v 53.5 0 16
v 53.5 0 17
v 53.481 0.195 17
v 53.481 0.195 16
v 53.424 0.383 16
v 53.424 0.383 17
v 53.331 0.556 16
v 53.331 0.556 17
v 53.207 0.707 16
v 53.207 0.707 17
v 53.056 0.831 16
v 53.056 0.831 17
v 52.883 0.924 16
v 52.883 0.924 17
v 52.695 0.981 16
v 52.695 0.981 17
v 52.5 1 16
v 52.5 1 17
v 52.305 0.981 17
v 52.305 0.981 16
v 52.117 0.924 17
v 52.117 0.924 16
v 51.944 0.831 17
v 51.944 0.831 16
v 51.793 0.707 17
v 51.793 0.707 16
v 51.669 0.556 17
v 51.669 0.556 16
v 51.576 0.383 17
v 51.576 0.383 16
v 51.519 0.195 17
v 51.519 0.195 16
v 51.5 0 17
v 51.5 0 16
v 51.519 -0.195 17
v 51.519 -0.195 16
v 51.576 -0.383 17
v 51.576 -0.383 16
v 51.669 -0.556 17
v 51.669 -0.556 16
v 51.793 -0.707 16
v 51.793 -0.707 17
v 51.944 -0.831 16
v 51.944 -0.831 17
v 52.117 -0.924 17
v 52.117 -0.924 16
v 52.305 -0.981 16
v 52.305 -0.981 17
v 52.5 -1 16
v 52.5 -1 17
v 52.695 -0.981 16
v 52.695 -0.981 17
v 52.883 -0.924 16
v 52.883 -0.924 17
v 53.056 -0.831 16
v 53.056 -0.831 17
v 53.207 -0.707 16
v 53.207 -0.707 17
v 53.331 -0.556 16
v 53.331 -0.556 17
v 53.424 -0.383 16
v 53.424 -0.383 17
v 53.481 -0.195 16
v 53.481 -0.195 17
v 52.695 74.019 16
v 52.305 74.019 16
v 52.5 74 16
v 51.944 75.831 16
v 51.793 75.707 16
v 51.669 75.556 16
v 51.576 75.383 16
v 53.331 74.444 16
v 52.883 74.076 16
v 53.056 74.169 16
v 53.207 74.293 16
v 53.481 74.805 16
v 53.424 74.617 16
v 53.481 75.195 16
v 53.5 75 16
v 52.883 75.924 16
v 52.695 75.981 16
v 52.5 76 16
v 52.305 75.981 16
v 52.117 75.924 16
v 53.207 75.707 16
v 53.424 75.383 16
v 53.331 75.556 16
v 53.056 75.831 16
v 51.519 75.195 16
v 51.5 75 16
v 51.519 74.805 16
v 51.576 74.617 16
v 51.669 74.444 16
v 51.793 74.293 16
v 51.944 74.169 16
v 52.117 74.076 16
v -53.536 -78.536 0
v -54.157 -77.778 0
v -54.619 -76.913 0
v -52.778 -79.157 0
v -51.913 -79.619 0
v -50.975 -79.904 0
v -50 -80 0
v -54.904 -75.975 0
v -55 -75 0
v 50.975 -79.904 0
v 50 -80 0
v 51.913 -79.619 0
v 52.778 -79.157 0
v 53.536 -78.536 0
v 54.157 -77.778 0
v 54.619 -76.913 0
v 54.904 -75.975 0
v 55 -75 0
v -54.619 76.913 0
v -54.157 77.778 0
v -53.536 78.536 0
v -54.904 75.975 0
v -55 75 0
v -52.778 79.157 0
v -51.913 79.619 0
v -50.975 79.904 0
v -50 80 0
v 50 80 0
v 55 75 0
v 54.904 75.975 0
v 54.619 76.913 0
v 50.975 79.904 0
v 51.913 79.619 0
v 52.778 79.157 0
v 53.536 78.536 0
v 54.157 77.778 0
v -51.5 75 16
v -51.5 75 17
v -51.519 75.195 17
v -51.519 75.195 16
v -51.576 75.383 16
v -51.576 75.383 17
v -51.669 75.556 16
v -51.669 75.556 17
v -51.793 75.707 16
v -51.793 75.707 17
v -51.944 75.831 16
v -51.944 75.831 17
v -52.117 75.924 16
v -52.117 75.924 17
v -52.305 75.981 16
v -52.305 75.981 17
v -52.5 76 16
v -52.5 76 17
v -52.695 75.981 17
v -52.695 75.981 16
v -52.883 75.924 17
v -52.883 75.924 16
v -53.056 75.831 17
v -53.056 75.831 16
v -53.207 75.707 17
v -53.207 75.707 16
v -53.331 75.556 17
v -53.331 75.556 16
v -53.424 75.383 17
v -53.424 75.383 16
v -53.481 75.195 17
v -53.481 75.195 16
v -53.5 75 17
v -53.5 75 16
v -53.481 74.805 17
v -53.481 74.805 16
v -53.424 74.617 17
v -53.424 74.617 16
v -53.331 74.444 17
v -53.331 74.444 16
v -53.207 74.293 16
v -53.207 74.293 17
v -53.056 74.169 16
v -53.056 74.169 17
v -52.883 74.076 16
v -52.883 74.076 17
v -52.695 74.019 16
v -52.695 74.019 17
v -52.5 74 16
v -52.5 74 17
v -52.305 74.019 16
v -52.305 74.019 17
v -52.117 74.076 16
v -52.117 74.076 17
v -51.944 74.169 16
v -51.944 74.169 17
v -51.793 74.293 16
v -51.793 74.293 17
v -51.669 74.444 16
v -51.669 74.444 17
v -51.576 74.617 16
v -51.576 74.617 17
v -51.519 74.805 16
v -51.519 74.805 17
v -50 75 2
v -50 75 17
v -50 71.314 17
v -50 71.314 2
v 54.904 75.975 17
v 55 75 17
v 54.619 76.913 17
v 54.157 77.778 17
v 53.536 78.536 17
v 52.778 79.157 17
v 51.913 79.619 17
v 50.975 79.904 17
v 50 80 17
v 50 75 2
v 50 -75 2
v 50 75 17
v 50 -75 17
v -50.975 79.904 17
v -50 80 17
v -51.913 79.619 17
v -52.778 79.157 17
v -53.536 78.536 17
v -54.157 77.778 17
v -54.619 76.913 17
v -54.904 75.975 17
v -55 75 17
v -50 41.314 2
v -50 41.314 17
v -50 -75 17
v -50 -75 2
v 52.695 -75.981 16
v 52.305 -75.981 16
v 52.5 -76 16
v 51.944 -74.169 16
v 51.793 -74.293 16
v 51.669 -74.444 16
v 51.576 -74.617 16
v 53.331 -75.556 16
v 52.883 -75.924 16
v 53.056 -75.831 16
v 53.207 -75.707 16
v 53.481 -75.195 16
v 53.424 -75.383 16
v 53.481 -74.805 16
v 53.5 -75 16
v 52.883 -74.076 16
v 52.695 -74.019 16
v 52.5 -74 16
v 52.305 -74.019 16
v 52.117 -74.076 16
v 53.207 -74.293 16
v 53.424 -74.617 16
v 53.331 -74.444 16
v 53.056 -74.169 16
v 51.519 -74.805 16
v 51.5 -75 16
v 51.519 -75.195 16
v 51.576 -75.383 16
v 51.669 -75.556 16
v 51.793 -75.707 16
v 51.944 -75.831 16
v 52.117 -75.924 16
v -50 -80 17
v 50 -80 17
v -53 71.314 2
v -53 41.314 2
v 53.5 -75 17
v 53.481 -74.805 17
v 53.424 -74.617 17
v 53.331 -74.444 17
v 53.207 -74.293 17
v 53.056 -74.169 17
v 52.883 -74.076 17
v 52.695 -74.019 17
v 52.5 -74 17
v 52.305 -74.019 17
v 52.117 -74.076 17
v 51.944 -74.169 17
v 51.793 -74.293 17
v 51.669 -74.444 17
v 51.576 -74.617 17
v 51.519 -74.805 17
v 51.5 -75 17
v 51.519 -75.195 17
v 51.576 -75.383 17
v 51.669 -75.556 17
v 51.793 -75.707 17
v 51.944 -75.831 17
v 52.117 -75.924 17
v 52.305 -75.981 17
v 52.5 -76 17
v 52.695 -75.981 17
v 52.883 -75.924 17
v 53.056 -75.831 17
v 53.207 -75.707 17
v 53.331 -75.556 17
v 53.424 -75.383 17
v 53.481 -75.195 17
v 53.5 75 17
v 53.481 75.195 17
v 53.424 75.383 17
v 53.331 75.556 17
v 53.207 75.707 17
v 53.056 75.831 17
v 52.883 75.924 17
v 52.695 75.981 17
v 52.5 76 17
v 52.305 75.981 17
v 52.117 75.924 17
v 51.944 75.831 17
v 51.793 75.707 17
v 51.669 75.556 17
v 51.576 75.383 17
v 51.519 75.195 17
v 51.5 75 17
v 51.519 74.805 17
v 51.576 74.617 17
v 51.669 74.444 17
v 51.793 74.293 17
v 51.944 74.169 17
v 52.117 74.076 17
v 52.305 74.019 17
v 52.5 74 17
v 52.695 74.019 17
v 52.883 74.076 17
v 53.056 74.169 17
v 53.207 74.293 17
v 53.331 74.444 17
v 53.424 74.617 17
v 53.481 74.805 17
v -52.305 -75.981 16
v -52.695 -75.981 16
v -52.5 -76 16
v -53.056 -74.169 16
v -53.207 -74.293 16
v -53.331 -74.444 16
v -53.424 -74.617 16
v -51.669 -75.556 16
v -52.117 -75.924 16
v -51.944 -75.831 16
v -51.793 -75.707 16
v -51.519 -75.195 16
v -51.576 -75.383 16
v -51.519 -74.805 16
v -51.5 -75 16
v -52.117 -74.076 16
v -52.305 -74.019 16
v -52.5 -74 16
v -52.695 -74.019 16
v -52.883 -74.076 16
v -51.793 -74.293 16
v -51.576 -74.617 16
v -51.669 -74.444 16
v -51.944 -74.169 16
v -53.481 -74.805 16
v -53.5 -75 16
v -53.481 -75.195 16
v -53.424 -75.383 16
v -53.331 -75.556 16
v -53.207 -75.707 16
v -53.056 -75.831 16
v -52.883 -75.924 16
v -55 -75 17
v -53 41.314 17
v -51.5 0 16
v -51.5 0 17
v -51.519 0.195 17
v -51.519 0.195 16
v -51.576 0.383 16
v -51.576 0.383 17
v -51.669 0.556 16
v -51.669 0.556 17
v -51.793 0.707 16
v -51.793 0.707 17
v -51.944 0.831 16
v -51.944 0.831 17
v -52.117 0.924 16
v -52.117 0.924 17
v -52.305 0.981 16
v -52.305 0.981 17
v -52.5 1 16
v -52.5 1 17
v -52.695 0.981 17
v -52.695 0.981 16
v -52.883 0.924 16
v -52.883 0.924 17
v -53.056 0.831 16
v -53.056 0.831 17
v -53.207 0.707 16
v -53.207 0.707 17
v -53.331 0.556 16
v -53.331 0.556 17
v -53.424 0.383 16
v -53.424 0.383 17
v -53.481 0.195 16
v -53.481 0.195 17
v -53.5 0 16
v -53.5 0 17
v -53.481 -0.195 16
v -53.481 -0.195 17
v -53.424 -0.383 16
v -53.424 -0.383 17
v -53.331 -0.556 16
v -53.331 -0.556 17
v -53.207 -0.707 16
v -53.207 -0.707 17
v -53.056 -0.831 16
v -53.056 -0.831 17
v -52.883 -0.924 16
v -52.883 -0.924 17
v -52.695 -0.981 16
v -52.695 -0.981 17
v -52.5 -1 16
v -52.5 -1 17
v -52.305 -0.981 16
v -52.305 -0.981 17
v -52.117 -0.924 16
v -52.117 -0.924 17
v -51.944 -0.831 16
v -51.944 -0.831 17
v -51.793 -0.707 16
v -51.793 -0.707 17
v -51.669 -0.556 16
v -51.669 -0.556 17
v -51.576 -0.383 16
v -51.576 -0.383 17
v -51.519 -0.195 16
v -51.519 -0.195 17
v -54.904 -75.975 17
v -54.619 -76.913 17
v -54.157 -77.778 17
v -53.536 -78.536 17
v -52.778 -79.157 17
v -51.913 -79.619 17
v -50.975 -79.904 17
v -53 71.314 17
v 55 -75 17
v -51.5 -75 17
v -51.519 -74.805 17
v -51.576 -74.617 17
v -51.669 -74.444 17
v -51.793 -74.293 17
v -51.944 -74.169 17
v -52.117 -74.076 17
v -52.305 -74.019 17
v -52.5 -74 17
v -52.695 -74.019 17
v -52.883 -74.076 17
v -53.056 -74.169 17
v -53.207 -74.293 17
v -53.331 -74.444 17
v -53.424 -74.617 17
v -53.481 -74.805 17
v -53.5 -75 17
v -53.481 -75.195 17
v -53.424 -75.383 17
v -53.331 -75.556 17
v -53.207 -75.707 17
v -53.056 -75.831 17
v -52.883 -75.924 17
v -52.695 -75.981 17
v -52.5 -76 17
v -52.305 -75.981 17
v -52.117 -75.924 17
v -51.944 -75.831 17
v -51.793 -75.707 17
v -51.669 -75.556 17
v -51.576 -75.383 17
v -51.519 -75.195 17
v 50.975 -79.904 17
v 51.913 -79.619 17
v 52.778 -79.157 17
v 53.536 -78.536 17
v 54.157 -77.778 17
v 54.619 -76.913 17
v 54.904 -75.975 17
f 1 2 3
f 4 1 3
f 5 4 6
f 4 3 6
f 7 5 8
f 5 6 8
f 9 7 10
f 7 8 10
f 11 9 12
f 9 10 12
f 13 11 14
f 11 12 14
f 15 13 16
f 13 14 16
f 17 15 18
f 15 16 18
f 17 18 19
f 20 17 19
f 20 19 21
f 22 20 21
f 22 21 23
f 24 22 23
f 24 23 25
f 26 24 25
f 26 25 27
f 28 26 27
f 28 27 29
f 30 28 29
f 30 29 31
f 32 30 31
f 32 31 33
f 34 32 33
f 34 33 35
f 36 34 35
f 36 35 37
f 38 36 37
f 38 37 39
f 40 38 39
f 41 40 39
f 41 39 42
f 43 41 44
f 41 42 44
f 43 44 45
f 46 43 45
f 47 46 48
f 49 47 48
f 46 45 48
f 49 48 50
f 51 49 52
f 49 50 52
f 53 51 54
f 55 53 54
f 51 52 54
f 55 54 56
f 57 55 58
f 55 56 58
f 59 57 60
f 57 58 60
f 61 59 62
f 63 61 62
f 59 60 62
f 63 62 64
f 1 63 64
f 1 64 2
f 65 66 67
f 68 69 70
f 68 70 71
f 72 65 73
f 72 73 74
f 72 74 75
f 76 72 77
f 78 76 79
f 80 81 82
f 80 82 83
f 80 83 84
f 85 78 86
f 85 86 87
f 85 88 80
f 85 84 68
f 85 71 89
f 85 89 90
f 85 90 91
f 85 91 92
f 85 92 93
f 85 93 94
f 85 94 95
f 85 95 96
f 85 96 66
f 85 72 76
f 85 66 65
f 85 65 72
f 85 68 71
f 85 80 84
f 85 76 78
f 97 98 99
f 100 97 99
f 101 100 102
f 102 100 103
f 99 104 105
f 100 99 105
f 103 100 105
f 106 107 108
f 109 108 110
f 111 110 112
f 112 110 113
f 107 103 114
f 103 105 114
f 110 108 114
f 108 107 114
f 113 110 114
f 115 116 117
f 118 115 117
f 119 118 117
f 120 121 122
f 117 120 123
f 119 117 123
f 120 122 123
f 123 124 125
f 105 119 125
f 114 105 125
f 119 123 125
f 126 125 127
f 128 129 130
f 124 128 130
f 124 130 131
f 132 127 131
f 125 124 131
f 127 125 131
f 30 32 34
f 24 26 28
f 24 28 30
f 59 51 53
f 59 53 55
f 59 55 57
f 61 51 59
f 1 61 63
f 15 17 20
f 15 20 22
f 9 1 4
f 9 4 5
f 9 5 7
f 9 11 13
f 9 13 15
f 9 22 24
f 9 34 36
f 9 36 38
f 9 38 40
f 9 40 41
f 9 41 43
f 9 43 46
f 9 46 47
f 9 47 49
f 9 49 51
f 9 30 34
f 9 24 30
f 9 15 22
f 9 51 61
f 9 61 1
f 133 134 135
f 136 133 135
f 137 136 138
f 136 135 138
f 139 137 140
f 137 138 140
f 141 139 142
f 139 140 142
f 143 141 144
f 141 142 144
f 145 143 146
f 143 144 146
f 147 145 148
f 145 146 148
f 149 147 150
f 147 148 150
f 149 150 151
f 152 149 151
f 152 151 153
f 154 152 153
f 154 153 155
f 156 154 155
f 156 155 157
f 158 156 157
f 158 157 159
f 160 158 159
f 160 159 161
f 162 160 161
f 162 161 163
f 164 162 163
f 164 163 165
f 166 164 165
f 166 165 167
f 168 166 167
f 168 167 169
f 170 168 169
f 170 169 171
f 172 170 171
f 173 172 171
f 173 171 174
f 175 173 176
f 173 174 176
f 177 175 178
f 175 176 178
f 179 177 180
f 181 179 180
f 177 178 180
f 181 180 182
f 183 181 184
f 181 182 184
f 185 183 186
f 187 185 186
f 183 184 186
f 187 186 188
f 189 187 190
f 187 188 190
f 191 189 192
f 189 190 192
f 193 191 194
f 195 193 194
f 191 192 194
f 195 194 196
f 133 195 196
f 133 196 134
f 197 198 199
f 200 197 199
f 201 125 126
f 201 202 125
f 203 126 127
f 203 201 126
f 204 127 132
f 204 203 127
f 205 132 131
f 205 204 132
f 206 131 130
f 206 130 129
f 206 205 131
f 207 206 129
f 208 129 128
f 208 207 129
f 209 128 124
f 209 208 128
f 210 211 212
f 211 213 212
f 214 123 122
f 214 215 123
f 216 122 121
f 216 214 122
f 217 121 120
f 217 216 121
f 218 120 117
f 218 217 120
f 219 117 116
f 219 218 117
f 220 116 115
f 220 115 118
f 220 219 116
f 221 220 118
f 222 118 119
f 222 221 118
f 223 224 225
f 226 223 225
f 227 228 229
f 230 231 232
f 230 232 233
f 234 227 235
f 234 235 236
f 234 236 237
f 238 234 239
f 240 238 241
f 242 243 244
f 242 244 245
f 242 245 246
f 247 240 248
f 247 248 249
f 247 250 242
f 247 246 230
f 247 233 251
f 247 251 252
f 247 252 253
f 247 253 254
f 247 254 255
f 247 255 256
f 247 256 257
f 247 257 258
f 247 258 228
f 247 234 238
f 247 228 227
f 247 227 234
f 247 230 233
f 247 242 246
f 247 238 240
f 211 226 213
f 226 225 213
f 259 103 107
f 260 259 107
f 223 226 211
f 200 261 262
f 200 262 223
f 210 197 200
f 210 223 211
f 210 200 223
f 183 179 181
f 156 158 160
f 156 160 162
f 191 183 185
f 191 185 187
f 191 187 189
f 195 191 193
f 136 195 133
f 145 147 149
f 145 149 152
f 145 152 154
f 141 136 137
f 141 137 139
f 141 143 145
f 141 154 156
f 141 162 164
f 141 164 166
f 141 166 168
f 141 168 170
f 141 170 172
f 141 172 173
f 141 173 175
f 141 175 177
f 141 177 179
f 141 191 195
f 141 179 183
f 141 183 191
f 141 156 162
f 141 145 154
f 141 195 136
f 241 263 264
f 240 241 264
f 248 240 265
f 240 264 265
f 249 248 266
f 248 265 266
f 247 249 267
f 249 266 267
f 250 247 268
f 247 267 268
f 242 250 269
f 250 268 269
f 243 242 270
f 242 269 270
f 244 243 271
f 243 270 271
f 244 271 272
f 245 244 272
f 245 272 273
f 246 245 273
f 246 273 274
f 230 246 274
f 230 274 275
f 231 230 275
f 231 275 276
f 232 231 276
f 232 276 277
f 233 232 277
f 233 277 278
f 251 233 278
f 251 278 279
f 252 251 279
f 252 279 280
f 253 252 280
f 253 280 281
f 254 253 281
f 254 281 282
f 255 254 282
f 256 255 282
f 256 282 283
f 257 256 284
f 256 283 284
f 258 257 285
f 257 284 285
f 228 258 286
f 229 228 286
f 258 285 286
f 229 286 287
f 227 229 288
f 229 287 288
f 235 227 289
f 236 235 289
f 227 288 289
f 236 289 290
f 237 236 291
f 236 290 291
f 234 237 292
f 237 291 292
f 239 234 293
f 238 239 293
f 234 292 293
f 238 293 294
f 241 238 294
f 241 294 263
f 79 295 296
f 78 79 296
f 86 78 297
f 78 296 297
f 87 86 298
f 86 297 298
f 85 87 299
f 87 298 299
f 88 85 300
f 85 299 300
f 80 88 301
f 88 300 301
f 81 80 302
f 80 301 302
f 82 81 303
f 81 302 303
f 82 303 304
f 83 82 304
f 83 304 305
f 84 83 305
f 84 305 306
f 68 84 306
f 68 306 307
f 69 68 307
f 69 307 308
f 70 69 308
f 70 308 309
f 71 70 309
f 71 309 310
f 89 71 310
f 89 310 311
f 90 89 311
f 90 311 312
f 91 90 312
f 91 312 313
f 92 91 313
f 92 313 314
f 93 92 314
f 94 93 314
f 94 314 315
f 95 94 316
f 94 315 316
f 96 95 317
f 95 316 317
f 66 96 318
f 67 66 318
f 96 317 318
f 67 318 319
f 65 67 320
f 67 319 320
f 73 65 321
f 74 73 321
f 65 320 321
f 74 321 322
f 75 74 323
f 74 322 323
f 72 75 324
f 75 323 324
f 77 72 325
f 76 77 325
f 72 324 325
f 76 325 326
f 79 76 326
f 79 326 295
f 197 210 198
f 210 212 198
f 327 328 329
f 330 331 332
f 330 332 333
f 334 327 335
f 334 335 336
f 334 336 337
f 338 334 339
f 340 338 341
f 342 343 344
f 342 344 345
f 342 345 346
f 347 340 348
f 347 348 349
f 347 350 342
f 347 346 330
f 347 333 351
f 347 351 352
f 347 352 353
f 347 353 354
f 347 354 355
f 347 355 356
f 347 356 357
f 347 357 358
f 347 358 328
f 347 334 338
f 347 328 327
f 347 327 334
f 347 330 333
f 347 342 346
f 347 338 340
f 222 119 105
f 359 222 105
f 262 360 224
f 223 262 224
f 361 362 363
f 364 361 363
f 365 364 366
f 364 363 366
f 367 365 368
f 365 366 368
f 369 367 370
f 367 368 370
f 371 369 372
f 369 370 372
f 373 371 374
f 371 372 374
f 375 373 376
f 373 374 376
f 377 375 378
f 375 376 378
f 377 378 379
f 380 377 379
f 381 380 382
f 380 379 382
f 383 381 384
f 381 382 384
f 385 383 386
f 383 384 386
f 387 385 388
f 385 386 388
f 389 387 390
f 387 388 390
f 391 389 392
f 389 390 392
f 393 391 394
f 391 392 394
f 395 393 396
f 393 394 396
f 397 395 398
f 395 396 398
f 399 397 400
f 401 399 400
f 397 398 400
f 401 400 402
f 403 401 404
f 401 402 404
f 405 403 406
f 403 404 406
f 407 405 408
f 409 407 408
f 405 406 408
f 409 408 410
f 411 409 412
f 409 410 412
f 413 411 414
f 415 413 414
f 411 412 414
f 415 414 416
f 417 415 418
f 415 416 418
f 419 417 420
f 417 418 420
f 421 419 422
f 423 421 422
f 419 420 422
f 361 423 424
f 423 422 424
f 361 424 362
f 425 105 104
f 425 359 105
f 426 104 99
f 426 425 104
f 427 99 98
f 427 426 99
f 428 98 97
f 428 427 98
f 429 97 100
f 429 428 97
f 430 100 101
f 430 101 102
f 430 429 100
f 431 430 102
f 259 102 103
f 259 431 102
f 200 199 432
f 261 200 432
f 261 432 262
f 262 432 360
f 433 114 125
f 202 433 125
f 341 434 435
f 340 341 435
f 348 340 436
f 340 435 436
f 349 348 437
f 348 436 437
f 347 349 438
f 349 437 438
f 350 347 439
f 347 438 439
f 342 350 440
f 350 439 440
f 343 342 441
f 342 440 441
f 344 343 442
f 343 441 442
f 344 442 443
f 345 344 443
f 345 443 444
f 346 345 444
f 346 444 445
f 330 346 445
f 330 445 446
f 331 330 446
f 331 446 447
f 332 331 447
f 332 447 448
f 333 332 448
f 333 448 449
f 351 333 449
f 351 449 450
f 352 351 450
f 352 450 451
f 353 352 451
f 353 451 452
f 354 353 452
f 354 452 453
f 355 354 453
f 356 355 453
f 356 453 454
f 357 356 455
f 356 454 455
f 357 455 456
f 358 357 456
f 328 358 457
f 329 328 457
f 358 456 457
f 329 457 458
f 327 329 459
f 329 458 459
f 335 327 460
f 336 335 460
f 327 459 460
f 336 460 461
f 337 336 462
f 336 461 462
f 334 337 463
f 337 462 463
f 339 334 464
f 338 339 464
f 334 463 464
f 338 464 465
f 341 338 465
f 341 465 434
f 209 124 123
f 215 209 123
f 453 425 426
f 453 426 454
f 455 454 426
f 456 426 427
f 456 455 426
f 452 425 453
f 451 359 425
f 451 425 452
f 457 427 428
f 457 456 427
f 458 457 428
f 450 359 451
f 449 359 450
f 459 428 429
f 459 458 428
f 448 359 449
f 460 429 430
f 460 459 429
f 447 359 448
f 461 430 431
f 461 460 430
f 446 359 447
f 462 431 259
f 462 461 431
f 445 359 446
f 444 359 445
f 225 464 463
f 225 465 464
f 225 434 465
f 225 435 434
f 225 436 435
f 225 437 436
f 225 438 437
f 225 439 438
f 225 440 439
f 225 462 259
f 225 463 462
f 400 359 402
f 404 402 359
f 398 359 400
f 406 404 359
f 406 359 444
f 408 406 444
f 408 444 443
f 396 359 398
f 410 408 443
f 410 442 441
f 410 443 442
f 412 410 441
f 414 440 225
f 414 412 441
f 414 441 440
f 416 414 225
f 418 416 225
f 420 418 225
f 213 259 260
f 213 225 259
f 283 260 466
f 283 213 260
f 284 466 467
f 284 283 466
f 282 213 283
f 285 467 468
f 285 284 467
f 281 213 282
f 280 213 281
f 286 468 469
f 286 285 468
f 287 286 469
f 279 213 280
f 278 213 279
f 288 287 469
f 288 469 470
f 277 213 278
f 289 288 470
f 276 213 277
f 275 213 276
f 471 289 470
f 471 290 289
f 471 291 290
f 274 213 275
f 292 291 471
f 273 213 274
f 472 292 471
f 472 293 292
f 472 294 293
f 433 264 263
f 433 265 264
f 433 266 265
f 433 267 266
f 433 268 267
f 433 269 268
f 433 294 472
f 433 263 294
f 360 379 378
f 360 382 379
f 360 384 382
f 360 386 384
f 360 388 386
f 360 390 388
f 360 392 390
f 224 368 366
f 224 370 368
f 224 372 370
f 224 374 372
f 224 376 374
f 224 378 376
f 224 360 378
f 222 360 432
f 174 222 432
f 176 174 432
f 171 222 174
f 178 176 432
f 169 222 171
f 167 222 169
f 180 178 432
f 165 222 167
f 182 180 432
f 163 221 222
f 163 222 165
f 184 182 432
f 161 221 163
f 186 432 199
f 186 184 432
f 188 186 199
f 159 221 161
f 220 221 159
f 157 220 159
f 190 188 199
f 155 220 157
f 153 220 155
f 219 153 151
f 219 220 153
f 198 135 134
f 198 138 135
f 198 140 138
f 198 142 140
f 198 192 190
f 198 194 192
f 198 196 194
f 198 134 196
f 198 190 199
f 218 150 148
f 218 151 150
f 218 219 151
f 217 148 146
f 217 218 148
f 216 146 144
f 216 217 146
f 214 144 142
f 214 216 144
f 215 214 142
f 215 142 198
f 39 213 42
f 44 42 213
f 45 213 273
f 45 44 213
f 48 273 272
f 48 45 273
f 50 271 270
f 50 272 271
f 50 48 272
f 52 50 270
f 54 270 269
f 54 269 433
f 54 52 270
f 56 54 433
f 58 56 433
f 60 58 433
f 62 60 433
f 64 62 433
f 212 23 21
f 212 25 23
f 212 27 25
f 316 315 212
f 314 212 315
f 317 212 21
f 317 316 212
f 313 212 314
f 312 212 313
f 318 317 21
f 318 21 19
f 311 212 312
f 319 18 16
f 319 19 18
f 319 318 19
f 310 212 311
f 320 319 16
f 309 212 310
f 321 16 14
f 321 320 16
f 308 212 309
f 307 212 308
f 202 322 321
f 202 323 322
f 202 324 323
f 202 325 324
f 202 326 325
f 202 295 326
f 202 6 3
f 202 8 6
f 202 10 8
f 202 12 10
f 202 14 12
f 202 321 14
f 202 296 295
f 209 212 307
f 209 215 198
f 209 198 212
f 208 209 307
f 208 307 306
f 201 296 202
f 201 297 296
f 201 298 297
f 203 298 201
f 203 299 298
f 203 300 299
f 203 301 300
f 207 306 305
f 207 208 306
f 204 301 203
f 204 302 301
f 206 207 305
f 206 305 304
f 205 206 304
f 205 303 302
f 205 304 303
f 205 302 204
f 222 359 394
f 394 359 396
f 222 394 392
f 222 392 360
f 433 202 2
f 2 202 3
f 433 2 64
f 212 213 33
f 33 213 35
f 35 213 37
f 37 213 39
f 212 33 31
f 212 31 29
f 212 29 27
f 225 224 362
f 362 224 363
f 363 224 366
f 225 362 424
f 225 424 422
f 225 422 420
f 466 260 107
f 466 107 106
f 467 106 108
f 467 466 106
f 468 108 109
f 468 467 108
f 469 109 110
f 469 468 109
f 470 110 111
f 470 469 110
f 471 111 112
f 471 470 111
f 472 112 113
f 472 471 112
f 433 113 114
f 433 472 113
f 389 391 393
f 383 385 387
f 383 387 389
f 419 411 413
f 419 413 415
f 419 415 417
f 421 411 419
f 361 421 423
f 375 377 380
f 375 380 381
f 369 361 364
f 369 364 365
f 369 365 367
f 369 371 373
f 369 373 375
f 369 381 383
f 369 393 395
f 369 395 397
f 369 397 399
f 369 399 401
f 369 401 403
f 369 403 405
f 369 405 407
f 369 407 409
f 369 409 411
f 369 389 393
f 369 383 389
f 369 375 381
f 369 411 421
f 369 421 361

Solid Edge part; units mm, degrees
sketch "Sketch1" plane through (0, 0, 0) normal (0, 0, 1) x (1, 0, 0)
  line L0 (55, -80) -> (55, 80)
  line L1 (55, 80) -> (-55, 80)
  line L2 (-55, 80) -> (-55, -80)
  line L3 (-55, -80) -> (55, -80)
extrude "ExtrudedProtrusion_2" add sketch "Sketch1" along normal blind 17
fillet "Round_3" radius 5 4 edges at (-55, 80, 8.5) (55, 80, 8.5) (55, -80, 8.5) (-55, -80, 8.5)
sketch "Sketch2" plane through (0, 0, 17) normal (0, 0, 1) x (1, 0, 0)
  line L0 (50, -75) -> (50, 75)
  line L1 (50, 75) -> (-50, 75)
  line L2 (-50, 75) -> (-50, -75)
  line L3 (-50, -75) -> (50, -75)
extrude "ExtrudedCutout_1" cut sketch "Sketch2" against normal blind 15
sketch "Sketch3" plane through (0, 0, 17) normal (0, 0, 1) x (1, 0, 0)
  circle A0 centre (-52.5, 75) radius 1
  circle A1 centre (52.5, 75) radius 1
  circle A2 centre (52.5, 0) radius 1
  circle A3 centre (52.5, -75) radius 1
  circle A4 centre (-52.5, -75) radius 1
  circle A5 centre (-52.5, 0) radius 1
extrude "ExtrudedCutout_2" cut sketch "Sketch3" against normal blind 1
sketch "Sketch4" plane through (0, 0, 17) normal (0, 0, 1) x (1, 0, 0)
  line L0 (-53, 71.3143) -> (-53, 51.3143)
  line L1 (-53, 51.3143) -> (-53, 41.3143)
  line L2 (-53, 41.3143) -> (-50, 41.3143)
  line L3 (-50, 41.3143) -> (-50, 71.3143)
  line L4 (-50, 71.3143) -> (-53, 71.3143)
extrude "ExtrudedCutout_3" cut sketch "Sketch4" against normal blind 15
